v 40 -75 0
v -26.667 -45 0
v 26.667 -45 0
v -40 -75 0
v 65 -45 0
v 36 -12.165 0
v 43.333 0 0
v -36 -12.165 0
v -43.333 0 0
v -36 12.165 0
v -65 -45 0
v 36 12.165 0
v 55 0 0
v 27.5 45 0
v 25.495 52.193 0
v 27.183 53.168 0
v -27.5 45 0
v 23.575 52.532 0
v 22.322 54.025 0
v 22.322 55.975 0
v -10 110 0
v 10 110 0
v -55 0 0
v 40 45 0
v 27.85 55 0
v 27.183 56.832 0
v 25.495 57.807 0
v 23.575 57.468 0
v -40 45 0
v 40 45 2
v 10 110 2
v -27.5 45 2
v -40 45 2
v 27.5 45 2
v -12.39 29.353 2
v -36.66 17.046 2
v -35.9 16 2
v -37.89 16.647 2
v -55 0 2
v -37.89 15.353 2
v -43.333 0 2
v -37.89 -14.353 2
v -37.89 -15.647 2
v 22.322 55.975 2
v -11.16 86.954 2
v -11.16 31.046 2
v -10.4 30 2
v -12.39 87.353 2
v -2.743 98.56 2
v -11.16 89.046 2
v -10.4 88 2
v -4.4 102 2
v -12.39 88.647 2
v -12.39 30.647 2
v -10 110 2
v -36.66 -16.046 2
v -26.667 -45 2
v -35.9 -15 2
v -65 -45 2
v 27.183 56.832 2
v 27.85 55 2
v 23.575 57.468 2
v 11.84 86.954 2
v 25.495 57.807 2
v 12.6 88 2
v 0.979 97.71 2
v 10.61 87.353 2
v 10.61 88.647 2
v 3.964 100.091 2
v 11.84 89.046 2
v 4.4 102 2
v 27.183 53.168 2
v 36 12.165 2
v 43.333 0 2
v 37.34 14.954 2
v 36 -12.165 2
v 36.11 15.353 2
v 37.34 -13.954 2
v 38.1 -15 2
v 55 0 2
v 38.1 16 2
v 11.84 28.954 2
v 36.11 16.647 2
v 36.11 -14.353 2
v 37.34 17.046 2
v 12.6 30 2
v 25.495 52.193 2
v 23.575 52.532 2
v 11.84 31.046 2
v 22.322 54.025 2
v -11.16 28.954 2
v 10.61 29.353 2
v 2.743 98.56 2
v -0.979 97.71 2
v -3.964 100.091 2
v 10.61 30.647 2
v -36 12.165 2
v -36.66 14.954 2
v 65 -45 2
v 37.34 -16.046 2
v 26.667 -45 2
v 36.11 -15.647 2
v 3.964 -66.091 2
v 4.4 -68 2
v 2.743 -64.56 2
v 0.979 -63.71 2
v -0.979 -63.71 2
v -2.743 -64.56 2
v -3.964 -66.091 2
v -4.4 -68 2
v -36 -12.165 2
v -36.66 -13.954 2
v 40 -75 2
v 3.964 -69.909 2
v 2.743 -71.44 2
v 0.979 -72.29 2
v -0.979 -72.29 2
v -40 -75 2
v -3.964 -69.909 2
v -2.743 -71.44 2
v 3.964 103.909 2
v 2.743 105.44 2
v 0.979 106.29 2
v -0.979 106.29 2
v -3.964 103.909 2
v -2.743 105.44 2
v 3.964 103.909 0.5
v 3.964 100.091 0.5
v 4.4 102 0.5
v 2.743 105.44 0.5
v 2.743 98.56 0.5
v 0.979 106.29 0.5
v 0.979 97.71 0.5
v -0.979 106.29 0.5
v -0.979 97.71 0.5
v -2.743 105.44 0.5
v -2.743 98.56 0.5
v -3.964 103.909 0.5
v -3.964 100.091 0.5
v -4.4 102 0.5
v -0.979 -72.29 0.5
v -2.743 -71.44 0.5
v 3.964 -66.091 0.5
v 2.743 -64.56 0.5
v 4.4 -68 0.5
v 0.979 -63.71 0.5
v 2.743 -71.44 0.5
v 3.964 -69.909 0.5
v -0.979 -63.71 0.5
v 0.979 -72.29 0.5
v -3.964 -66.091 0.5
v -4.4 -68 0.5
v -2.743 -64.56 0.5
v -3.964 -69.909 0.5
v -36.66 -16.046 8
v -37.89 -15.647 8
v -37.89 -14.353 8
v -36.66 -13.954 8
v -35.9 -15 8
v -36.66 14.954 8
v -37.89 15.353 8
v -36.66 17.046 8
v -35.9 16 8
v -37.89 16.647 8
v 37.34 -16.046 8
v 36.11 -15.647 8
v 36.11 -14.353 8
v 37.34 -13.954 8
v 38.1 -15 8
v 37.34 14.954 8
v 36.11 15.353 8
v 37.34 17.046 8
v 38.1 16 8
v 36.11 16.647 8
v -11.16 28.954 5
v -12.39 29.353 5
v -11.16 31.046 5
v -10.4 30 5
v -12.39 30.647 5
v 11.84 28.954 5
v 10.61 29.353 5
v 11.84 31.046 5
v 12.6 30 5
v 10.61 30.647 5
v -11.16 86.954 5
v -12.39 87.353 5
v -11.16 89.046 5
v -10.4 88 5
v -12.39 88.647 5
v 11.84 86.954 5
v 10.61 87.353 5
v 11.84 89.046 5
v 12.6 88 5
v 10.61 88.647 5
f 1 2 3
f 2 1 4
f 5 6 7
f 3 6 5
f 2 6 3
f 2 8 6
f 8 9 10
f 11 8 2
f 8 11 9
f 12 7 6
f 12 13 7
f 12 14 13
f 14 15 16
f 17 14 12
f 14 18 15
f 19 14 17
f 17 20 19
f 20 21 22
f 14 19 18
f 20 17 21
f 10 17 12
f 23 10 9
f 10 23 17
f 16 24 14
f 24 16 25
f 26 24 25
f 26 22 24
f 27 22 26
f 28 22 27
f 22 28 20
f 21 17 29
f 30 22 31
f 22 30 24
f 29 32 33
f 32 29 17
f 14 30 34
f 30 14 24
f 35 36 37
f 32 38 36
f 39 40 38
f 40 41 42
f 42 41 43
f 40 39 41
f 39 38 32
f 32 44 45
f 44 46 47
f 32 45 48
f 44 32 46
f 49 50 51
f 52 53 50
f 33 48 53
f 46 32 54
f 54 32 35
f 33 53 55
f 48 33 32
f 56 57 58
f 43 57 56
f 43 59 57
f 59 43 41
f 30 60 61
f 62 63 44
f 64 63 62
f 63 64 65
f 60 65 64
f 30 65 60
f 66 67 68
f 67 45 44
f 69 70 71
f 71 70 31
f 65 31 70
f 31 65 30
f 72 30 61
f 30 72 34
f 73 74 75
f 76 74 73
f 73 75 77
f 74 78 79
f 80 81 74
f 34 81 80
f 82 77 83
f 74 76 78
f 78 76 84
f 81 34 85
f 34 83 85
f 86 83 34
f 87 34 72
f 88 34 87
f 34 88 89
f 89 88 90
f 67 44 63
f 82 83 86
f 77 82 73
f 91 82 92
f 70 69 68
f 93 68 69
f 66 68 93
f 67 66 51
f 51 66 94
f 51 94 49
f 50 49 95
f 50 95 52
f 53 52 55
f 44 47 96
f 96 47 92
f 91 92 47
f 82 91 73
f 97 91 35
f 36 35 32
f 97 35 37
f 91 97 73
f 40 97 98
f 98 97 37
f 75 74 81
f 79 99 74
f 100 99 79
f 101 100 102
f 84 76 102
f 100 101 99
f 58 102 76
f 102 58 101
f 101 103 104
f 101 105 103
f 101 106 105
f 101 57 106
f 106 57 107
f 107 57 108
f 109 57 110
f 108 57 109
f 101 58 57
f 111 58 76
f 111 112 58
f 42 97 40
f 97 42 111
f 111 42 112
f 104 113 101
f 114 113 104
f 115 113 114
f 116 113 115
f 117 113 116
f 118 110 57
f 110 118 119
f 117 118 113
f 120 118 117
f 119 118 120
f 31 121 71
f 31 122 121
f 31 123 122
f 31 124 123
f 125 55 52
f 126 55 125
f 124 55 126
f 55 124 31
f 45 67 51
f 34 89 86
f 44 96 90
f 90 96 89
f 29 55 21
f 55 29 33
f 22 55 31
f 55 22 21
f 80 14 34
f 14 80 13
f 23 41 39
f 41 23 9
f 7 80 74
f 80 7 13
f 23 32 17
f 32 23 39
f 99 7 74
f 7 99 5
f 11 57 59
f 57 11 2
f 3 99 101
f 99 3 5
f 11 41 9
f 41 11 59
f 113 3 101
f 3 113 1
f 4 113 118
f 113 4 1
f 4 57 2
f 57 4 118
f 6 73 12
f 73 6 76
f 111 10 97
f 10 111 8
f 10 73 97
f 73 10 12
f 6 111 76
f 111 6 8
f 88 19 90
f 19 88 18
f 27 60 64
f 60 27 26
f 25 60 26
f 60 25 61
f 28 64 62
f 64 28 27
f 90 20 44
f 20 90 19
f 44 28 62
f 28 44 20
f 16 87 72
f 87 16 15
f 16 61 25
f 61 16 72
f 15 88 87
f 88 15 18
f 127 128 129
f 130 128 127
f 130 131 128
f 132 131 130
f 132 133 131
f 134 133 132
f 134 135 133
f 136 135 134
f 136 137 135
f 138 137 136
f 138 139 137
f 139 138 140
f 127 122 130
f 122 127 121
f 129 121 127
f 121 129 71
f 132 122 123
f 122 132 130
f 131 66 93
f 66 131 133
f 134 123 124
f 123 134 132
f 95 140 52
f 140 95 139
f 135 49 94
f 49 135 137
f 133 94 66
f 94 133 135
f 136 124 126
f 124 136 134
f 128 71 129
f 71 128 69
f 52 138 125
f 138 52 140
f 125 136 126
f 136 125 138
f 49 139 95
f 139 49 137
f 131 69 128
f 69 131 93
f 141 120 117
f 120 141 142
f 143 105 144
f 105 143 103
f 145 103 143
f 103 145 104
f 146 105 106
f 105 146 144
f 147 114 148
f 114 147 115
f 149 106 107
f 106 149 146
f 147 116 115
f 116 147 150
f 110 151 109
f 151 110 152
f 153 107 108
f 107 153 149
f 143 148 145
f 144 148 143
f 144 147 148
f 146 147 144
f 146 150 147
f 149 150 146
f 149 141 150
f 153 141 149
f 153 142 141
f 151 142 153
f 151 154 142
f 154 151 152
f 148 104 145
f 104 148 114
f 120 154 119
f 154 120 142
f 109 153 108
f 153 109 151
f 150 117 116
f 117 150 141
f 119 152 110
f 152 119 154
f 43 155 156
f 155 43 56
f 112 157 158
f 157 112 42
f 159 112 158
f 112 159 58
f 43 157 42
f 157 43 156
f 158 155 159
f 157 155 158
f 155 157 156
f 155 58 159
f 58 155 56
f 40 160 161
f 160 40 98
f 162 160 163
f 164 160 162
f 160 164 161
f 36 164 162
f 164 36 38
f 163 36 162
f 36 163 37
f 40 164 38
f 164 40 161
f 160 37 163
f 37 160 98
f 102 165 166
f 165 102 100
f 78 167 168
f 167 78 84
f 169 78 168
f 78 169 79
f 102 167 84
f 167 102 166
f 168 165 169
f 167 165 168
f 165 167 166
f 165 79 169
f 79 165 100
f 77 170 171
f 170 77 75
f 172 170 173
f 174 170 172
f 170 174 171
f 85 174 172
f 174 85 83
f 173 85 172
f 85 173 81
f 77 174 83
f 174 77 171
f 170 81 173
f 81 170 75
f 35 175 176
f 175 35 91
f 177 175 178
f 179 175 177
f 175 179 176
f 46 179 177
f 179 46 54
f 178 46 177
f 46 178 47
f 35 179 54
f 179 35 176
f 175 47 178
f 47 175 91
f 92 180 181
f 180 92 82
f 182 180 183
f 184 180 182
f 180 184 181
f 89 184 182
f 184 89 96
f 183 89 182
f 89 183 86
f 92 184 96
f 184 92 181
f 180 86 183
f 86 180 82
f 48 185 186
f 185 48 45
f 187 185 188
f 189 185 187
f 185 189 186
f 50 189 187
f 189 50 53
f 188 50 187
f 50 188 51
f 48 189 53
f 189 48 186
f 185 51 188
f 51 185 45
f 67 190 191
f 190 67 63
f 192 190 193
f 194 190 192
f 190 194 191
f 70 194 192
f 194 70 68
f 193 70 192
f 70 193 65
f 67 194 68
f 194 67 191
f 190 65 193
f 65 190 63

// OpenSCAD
displX = 37;

dispToplY = 16;

displBottomY = 15;

displZ = 0;

stroke = 1;

dispZero = 30;

module lcd_tree() {
    difference() {
        tree();
        
        // lcd screen
        translate([0, 0, -2]) cube([72,24.33,15],center=true);    
        
        // led
        translate([25, 55, -2]) cylinder(h=5, d=5.7);
        
        // iman
        translate([0, 102, 0.5]) cylinder(h=5, r=4.4);
        translate([0, -68, 0.5]) cylinder(h=5, r=4.4);
        
    }
    
    // lcd holes
    translate([-displX, -displBottomY, displZ]) cylinder(h=8, d=2.2);
    translate([-displX, dispToplY, displZ]) cylinder(h=8, d=2.2);
    translate([displX, -displBottomY, displZ]) cylinder(h=8, d=2.2);
    translate([displX, dispToplY, displZ]) cylinder(h=8, d=2.2);
    
    // pi
    translate([-11.5, dispZero, displZ]) cylinder(h=5, d=2.2);
    translate([11.5, dispZero, displZ]) cylinder(h=5, d=2.2);
    translate([-11.5, 58 + dispZero, displZ]) cylinder(h=5, d=2.2);
    translate([11.5, 58 + dispZero, displZ]) cylinder(h=5, d=2.2);
    
}

module tree() {
    heightTop = 55;
    height = 45;
    heightBase = 30;
    widthTop = 40;
    widthMiddle = 55;
    widthBottom = 65;
    widthBase = 40;
    
    CubeFaces = [
      [0,1,2,3],  // bottom
      [4,5,1,0],  // front
      [7,6,5,4],  // top
      [5,6,2,1],  // right
      [6,7,3,2],  // back
      [7,4,0,3]]; // left

    CubePointsTop = [
      [  -widthTop,  height,  0 ],  //0
      [ widthTop,  height,  0 ],  //1
      [ widthTop / 4,  heightTop * 2,  0 ],  //2
      [  -widthTop / 4,  heightTop * 2,  0 ],  //3
      [  -widthTop,  height,  2 ],  //4
      [ widthTop,  height,  2 ],  //5
      [ widthTop / 4,  heightTop * 2,  2 ],  //6
      [  -widthTop / 4,  heightTop * 2,  2 ]]; //7
      
    polyhedron( CubePointsTop, CubeFaces );

    CubePointsMiddle = [
      [  -widthMiddle,  0,  0 ],  //0
      [ widthMiddle,  0,  0 ],  //1
      [ widthMiddle / 2,  height,  0 ],  //2
      [  -widthMiddle / 2,  height,  0 ],  //3
      [  -widthMiddle,  0,  2 ],  //4
      [ widthMiddle,  0,  2 ],  //5
      [ widthMiddle / 2,  height,  2 ],  //6
      [  -widthMiddle / 2,  height,  2 ]]; //7
      
    polyhedron( CubePointsMiddle, CubeFaces );

    CubePointsBottom = [
      [  -widthBottom,  -height,  0 ],  //0
      [ widthBottom,  -height,  0 ],  //1
      [ widthBottom / 1.5,  0,  0 ],  //2
      [  -widthBottom / 1.5,  0,  0 ],  //3
      [  -widthBottom,  -height,  2 ],  //4
      [ widthBottom,  -height,  2 ],  //5
      [ widthBottom / 1.5,  0,  2 ],  //6
      [  -widthBottom / 1.5,  0,  2 ]]; //7

    polyhedron( CubePointsBottom, CubeFaces );
    
    CubePointsBase = [
      [  -widthBase,  -height - heightBase,  0 ],  //0
      [ widthBase,  -height - heightBase,  0 ],  //1
      [ widthBase / 1.5,  -height,  0 ],  //2
      [  -widthBase / 1.5,  -height,  0 ],  //3
      [  -widthBase,  -height - heightBase,  2 ],  //4
      [ widthBase,  -height - heightBase,  2 ],  //5
      [ widthBase / 1.5,  -height,  2 ],  //6
      [  -widthBase / 1.5,  -height,  2 ]]; //7
    
    polyhedron( CubePointsBase, CubeFaces );
}

lcd_tree();
